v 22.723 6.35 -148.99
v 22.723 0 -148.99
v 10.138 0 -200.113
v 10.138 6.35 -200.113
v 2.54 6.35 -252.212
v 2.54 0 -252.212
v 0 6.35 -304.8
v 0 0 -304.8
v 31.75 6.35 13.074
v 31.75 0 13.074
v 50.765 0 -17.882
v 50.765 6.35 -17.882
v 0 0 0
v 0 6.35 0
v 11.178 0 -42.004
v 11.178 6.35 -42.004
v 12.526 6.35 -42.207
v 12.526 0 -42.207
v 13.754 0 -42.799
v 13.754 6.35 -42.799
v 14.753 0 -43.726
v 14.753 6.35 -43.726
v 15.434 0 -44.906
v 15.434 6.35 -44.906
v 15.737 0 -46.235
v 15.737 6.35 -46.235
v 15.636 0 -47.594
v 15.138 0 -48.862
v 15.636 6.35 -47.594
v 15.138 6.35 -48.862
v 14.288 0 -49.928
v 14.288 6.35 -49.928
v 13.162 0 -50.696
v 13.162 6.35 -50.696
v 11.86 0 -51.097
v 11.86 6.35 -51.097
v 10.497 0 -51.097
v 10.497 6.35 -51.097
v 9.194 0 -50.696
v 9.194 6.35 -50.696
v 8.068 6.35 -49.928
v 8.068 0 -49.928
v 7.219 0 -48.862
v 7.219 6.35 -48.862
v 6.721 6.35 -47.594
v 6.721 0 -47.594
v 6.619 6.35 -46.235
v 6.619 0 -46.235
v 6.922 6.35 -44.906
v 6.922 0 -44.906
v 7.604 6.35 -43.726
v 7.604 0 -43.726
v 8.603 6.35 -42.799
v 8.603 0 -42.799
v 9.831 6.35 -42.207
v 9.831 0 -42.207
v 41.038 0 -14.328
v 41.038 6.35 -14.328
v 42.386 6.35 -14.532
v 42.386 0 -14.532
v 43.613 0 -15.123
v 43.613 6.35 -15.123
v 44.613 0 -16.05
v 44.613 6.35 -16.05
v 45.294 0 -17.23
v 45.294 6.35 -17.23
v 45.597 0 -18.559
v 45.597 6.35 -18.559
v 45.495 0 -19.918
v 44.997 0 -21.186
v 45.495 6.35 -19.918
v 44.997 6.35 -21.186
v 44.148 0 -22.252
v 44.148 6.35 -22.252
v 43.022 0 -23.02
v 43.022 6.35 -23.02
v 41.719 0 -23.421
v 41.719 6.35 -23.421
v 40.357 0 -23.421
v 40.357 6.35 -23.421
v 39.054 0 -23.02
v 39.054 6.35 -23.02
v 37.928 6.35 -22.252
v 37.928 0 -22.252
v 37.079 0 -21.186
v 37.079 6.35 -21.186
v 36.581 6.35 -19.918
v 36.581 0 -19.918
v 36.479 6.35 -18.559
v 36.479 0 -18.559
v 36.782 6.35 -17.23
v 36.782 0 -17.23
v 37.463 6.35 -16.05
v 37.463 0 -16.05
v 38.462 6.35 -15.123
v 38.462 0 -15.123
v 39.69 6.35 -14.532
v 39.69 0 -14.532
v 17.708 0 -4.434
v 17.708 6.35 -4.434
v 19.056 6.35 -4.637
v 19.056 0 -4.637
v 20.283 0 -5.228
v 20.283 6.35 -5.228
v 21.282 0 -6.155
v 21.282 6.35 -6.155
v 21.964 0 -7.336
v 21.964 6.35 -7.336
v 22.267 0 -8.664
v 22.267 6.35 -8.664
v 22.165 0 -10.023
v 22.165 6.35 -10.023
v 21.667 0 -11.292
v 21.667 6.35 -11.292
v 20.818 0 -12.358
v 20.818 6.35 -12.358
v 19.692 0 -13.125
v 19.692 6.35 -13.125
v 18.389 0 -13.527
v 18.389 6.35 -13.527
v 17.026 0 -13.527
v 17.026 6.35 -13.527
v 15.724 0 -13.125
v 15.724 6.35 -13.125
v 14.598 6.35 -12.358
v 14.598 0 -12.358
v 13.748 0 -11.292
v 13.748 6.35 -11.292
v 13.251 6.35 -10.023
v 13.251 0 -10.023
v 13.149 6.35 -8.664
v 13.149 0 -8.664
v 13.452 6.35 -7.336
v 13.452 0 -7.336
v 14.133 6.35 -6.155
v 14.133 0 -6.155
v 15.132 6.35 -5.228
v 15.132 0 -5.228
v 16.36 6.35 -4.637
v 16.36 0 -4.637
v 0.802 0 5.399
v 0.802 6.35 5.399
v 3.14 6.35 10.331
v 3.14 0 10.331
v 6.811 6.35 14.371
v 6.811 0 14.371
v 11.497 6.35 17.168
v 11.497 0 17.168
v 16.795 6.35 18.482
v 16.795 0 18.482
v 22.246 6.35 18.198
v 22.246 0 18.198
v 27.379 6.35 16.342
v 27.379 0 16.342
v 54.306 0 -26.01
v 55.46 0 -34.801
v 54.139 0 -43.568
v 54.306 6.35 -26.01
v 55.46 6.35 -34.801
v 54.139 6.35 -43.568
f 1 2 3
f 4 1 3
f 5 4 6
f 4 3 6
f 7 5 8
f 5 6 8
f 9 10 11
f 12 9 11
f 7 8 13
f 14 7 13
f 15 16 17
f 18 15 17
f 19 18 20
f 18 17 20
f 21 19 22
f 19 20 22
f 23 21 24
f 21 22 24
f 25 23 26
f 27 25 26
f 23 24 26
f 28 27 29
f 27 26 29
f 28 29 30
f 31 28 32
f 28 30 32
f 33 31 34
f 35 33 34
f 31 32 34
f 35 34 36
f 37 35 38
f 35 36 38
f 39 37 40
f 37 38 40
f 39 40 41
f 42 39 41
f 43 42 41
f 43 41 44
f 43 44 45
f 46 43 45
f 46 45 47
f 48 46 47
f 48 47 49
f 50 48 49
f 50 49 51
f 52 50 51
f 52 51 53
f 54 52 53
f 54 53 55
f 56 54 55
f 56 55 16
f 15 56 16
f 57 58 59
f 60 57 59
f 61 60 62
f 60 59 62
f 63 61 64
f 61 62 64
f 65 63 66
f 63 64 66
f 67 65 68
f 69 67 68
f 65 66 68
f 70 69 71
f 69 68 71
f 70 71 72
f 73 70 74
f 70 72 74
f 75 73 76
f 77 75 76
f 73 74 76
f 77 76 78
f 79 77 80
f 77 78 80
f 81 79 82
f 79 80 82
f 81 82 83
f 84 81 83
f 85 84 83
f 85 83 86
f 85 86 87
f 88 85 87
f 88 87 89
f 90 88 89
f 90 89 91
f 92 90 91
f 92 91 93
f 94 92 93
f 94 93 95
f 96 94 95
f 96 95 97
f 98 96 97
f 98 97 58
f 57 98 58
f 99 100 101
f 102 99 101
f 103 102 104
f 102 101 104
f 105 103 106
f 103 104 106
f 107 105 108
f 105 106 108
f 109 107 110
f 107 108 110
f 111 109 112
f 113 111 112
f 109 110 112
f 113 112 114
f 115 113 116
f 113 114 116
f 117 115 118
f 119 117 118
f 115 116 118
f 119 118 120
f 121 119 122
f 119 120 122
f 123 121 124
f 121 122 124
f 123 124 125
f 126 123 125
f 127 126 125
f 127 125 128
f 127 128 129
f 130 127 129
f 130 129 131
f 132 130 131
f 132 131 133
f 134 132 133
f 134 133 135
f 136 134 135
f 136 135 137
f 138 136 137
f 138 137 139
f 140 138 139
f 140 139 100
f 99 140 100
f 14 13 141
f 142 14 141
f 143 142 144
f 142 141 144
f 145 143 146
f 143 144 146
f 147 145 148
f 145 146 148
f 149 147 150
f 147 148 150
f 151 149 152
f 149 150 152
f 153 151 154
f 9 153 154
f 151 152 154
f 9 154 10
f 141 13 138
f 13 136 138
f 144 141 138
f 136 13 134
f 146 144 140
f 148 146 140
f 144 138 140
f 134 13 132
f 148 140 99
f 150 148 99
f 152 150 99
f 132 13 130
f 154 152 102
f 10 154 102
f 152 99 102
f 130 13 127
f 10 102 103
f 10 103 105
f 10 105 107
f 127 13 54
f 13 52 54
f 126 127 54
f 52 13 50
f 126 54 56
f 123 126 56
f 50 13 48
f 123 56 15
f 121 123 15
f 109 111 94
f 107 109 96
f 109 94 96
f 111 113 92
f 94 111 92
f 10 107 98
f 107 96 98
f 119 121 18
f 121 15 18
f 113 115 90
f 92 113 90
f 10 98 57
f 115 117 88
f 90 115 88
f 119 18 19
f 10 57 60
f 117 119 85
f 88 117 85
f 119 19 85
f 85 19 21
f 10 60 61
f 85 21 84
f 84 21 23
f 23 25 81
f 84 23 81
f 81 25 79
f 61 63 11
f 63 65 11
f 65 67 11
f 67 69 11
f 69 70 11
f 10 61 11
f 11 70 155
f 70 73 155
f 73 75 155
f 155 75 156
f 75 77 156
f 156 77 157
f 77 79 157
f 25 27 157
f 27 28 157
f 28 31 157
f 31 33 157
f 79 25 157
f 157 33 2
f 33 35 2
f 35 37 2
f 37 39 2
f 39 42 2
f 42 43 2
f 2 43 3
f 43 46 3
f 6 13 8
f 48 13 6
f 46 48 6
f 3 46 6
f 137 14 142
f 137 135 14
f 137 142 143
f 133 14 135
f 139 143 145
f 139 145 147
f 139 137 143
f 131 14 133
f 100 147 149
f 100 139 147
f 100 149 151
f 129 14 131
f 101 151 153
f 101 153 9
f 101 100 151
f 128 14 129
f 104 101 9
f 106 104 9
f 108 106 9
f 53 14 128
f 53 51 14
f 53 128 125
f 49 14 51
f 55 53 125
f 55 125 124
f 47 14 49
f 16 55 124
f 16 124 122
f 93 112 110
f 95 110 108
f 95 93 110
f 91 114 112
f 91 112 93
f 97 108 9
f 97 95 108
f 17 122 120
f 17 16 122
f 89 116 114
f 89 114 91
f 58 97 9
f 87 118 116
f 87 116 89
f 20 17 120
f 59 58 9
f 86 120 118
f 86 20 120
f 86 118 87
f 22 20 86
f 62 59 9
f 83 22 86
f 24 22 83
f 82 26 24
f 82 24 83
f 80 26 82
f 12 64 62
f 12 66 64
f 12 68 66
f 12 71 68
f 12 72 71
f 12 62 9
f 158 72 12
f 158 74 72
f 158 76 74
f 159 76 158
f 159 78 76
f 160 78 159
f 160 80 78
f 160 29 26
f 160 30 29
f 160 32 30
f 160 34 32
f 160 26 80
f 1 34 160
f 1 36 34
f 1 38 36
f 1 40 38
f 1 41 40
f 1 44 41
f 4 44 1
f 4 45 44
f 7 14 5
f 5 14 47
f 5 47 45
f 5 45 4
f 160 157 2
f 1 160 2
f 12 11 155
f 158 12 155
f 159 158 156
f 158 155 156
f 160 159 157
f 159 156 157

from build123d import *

# Parameters (mm, degrees)
BOSS_EXTRUDE1_DEPTH = 6.35
SKETCH2_W           = 19.05
SKETCH2_H           = 190.5
CUT_EXTRUDE1_DEPTH  = 310.869909223
SKETCH3_R           = 4.572
CUT_EXTRUDE2_DEPTH  = 310.869909223


with BuildPart() as part:
    # Sketch1 → Boss-Extrude1 (new body)
    with BuildSketch(Plane(origin=(0, 0, 0), x_dir=(1, 0, 0), z_dir=(0, 1, 0))):
        with BuildLine():
            Line((31.75, -13.073529412), (50.765202328, 17.881902266))
            ThreePointArc((50.765202328, 17.881902266), (55.191250928, 30.365130488), (54.139291827, 43.567943639))
            Line((54.139291827, 43.567943639), (22.722603429, 148.989996692))
            ThreePointArc((22.722603429, 148.989996692), (5.710537817, 226.070917322), (0, 304.8))
            Line((0, 304.8), (-19.05, 304.8))
            Line((-19.05, 304.8), (-19.05, 114.3))
            Line((-19.05, 114.3), (0, 114.3))
            Line((0, 114.3), (0, 0))
            ThreePointArc((0, 0), (11.497376237, -17.168136702), (31.75, -13.073529412))
        make_face()
    extrude(amount=BOSS_EXTRUDE1_DEPTH)

    # Sketch2 → Cut-Extrude1 (cut, through all)
    with BuildSketch(Plane(origin=(0, 6.35, 0), x_dir=(1, 0, 0), z_dir=(0, 1, 0))):
        with Locations((-9.525, 209.55)):
            Rectangle(SKETCH2_W, SKETCH2_H)
    extrude(amount=-CUT_EXTRUDE1_DEPTH, mode=Mode.SUBTRACT)

    # Sketch3 → Cut-Extrude2 (cut, through all)
    with BuildSketch(Plane(origin=(0, 6.35, 0), x_dir=(1, 0, 0), z_dir=(0, 1, 0))):
        with Locations(Location((11.178180871, 46.576310918, 0), (0, 0, 270))):
            Circle(SKETCH3_R)
        with Locations(Location((17.707917982, 9.005992113, 0), (0, 0, 270))):
            Circle(SKETCH3_R)
        with Locations(Location((41.037990009, 18.900486467, 0), (0, 0, 270))):
            Circle(SKETCH3_R)
    extrude(amount=-CUT_EXTRUDE2_DEPTH, mode=Mode.SUBTRACT)


solid = part.part
